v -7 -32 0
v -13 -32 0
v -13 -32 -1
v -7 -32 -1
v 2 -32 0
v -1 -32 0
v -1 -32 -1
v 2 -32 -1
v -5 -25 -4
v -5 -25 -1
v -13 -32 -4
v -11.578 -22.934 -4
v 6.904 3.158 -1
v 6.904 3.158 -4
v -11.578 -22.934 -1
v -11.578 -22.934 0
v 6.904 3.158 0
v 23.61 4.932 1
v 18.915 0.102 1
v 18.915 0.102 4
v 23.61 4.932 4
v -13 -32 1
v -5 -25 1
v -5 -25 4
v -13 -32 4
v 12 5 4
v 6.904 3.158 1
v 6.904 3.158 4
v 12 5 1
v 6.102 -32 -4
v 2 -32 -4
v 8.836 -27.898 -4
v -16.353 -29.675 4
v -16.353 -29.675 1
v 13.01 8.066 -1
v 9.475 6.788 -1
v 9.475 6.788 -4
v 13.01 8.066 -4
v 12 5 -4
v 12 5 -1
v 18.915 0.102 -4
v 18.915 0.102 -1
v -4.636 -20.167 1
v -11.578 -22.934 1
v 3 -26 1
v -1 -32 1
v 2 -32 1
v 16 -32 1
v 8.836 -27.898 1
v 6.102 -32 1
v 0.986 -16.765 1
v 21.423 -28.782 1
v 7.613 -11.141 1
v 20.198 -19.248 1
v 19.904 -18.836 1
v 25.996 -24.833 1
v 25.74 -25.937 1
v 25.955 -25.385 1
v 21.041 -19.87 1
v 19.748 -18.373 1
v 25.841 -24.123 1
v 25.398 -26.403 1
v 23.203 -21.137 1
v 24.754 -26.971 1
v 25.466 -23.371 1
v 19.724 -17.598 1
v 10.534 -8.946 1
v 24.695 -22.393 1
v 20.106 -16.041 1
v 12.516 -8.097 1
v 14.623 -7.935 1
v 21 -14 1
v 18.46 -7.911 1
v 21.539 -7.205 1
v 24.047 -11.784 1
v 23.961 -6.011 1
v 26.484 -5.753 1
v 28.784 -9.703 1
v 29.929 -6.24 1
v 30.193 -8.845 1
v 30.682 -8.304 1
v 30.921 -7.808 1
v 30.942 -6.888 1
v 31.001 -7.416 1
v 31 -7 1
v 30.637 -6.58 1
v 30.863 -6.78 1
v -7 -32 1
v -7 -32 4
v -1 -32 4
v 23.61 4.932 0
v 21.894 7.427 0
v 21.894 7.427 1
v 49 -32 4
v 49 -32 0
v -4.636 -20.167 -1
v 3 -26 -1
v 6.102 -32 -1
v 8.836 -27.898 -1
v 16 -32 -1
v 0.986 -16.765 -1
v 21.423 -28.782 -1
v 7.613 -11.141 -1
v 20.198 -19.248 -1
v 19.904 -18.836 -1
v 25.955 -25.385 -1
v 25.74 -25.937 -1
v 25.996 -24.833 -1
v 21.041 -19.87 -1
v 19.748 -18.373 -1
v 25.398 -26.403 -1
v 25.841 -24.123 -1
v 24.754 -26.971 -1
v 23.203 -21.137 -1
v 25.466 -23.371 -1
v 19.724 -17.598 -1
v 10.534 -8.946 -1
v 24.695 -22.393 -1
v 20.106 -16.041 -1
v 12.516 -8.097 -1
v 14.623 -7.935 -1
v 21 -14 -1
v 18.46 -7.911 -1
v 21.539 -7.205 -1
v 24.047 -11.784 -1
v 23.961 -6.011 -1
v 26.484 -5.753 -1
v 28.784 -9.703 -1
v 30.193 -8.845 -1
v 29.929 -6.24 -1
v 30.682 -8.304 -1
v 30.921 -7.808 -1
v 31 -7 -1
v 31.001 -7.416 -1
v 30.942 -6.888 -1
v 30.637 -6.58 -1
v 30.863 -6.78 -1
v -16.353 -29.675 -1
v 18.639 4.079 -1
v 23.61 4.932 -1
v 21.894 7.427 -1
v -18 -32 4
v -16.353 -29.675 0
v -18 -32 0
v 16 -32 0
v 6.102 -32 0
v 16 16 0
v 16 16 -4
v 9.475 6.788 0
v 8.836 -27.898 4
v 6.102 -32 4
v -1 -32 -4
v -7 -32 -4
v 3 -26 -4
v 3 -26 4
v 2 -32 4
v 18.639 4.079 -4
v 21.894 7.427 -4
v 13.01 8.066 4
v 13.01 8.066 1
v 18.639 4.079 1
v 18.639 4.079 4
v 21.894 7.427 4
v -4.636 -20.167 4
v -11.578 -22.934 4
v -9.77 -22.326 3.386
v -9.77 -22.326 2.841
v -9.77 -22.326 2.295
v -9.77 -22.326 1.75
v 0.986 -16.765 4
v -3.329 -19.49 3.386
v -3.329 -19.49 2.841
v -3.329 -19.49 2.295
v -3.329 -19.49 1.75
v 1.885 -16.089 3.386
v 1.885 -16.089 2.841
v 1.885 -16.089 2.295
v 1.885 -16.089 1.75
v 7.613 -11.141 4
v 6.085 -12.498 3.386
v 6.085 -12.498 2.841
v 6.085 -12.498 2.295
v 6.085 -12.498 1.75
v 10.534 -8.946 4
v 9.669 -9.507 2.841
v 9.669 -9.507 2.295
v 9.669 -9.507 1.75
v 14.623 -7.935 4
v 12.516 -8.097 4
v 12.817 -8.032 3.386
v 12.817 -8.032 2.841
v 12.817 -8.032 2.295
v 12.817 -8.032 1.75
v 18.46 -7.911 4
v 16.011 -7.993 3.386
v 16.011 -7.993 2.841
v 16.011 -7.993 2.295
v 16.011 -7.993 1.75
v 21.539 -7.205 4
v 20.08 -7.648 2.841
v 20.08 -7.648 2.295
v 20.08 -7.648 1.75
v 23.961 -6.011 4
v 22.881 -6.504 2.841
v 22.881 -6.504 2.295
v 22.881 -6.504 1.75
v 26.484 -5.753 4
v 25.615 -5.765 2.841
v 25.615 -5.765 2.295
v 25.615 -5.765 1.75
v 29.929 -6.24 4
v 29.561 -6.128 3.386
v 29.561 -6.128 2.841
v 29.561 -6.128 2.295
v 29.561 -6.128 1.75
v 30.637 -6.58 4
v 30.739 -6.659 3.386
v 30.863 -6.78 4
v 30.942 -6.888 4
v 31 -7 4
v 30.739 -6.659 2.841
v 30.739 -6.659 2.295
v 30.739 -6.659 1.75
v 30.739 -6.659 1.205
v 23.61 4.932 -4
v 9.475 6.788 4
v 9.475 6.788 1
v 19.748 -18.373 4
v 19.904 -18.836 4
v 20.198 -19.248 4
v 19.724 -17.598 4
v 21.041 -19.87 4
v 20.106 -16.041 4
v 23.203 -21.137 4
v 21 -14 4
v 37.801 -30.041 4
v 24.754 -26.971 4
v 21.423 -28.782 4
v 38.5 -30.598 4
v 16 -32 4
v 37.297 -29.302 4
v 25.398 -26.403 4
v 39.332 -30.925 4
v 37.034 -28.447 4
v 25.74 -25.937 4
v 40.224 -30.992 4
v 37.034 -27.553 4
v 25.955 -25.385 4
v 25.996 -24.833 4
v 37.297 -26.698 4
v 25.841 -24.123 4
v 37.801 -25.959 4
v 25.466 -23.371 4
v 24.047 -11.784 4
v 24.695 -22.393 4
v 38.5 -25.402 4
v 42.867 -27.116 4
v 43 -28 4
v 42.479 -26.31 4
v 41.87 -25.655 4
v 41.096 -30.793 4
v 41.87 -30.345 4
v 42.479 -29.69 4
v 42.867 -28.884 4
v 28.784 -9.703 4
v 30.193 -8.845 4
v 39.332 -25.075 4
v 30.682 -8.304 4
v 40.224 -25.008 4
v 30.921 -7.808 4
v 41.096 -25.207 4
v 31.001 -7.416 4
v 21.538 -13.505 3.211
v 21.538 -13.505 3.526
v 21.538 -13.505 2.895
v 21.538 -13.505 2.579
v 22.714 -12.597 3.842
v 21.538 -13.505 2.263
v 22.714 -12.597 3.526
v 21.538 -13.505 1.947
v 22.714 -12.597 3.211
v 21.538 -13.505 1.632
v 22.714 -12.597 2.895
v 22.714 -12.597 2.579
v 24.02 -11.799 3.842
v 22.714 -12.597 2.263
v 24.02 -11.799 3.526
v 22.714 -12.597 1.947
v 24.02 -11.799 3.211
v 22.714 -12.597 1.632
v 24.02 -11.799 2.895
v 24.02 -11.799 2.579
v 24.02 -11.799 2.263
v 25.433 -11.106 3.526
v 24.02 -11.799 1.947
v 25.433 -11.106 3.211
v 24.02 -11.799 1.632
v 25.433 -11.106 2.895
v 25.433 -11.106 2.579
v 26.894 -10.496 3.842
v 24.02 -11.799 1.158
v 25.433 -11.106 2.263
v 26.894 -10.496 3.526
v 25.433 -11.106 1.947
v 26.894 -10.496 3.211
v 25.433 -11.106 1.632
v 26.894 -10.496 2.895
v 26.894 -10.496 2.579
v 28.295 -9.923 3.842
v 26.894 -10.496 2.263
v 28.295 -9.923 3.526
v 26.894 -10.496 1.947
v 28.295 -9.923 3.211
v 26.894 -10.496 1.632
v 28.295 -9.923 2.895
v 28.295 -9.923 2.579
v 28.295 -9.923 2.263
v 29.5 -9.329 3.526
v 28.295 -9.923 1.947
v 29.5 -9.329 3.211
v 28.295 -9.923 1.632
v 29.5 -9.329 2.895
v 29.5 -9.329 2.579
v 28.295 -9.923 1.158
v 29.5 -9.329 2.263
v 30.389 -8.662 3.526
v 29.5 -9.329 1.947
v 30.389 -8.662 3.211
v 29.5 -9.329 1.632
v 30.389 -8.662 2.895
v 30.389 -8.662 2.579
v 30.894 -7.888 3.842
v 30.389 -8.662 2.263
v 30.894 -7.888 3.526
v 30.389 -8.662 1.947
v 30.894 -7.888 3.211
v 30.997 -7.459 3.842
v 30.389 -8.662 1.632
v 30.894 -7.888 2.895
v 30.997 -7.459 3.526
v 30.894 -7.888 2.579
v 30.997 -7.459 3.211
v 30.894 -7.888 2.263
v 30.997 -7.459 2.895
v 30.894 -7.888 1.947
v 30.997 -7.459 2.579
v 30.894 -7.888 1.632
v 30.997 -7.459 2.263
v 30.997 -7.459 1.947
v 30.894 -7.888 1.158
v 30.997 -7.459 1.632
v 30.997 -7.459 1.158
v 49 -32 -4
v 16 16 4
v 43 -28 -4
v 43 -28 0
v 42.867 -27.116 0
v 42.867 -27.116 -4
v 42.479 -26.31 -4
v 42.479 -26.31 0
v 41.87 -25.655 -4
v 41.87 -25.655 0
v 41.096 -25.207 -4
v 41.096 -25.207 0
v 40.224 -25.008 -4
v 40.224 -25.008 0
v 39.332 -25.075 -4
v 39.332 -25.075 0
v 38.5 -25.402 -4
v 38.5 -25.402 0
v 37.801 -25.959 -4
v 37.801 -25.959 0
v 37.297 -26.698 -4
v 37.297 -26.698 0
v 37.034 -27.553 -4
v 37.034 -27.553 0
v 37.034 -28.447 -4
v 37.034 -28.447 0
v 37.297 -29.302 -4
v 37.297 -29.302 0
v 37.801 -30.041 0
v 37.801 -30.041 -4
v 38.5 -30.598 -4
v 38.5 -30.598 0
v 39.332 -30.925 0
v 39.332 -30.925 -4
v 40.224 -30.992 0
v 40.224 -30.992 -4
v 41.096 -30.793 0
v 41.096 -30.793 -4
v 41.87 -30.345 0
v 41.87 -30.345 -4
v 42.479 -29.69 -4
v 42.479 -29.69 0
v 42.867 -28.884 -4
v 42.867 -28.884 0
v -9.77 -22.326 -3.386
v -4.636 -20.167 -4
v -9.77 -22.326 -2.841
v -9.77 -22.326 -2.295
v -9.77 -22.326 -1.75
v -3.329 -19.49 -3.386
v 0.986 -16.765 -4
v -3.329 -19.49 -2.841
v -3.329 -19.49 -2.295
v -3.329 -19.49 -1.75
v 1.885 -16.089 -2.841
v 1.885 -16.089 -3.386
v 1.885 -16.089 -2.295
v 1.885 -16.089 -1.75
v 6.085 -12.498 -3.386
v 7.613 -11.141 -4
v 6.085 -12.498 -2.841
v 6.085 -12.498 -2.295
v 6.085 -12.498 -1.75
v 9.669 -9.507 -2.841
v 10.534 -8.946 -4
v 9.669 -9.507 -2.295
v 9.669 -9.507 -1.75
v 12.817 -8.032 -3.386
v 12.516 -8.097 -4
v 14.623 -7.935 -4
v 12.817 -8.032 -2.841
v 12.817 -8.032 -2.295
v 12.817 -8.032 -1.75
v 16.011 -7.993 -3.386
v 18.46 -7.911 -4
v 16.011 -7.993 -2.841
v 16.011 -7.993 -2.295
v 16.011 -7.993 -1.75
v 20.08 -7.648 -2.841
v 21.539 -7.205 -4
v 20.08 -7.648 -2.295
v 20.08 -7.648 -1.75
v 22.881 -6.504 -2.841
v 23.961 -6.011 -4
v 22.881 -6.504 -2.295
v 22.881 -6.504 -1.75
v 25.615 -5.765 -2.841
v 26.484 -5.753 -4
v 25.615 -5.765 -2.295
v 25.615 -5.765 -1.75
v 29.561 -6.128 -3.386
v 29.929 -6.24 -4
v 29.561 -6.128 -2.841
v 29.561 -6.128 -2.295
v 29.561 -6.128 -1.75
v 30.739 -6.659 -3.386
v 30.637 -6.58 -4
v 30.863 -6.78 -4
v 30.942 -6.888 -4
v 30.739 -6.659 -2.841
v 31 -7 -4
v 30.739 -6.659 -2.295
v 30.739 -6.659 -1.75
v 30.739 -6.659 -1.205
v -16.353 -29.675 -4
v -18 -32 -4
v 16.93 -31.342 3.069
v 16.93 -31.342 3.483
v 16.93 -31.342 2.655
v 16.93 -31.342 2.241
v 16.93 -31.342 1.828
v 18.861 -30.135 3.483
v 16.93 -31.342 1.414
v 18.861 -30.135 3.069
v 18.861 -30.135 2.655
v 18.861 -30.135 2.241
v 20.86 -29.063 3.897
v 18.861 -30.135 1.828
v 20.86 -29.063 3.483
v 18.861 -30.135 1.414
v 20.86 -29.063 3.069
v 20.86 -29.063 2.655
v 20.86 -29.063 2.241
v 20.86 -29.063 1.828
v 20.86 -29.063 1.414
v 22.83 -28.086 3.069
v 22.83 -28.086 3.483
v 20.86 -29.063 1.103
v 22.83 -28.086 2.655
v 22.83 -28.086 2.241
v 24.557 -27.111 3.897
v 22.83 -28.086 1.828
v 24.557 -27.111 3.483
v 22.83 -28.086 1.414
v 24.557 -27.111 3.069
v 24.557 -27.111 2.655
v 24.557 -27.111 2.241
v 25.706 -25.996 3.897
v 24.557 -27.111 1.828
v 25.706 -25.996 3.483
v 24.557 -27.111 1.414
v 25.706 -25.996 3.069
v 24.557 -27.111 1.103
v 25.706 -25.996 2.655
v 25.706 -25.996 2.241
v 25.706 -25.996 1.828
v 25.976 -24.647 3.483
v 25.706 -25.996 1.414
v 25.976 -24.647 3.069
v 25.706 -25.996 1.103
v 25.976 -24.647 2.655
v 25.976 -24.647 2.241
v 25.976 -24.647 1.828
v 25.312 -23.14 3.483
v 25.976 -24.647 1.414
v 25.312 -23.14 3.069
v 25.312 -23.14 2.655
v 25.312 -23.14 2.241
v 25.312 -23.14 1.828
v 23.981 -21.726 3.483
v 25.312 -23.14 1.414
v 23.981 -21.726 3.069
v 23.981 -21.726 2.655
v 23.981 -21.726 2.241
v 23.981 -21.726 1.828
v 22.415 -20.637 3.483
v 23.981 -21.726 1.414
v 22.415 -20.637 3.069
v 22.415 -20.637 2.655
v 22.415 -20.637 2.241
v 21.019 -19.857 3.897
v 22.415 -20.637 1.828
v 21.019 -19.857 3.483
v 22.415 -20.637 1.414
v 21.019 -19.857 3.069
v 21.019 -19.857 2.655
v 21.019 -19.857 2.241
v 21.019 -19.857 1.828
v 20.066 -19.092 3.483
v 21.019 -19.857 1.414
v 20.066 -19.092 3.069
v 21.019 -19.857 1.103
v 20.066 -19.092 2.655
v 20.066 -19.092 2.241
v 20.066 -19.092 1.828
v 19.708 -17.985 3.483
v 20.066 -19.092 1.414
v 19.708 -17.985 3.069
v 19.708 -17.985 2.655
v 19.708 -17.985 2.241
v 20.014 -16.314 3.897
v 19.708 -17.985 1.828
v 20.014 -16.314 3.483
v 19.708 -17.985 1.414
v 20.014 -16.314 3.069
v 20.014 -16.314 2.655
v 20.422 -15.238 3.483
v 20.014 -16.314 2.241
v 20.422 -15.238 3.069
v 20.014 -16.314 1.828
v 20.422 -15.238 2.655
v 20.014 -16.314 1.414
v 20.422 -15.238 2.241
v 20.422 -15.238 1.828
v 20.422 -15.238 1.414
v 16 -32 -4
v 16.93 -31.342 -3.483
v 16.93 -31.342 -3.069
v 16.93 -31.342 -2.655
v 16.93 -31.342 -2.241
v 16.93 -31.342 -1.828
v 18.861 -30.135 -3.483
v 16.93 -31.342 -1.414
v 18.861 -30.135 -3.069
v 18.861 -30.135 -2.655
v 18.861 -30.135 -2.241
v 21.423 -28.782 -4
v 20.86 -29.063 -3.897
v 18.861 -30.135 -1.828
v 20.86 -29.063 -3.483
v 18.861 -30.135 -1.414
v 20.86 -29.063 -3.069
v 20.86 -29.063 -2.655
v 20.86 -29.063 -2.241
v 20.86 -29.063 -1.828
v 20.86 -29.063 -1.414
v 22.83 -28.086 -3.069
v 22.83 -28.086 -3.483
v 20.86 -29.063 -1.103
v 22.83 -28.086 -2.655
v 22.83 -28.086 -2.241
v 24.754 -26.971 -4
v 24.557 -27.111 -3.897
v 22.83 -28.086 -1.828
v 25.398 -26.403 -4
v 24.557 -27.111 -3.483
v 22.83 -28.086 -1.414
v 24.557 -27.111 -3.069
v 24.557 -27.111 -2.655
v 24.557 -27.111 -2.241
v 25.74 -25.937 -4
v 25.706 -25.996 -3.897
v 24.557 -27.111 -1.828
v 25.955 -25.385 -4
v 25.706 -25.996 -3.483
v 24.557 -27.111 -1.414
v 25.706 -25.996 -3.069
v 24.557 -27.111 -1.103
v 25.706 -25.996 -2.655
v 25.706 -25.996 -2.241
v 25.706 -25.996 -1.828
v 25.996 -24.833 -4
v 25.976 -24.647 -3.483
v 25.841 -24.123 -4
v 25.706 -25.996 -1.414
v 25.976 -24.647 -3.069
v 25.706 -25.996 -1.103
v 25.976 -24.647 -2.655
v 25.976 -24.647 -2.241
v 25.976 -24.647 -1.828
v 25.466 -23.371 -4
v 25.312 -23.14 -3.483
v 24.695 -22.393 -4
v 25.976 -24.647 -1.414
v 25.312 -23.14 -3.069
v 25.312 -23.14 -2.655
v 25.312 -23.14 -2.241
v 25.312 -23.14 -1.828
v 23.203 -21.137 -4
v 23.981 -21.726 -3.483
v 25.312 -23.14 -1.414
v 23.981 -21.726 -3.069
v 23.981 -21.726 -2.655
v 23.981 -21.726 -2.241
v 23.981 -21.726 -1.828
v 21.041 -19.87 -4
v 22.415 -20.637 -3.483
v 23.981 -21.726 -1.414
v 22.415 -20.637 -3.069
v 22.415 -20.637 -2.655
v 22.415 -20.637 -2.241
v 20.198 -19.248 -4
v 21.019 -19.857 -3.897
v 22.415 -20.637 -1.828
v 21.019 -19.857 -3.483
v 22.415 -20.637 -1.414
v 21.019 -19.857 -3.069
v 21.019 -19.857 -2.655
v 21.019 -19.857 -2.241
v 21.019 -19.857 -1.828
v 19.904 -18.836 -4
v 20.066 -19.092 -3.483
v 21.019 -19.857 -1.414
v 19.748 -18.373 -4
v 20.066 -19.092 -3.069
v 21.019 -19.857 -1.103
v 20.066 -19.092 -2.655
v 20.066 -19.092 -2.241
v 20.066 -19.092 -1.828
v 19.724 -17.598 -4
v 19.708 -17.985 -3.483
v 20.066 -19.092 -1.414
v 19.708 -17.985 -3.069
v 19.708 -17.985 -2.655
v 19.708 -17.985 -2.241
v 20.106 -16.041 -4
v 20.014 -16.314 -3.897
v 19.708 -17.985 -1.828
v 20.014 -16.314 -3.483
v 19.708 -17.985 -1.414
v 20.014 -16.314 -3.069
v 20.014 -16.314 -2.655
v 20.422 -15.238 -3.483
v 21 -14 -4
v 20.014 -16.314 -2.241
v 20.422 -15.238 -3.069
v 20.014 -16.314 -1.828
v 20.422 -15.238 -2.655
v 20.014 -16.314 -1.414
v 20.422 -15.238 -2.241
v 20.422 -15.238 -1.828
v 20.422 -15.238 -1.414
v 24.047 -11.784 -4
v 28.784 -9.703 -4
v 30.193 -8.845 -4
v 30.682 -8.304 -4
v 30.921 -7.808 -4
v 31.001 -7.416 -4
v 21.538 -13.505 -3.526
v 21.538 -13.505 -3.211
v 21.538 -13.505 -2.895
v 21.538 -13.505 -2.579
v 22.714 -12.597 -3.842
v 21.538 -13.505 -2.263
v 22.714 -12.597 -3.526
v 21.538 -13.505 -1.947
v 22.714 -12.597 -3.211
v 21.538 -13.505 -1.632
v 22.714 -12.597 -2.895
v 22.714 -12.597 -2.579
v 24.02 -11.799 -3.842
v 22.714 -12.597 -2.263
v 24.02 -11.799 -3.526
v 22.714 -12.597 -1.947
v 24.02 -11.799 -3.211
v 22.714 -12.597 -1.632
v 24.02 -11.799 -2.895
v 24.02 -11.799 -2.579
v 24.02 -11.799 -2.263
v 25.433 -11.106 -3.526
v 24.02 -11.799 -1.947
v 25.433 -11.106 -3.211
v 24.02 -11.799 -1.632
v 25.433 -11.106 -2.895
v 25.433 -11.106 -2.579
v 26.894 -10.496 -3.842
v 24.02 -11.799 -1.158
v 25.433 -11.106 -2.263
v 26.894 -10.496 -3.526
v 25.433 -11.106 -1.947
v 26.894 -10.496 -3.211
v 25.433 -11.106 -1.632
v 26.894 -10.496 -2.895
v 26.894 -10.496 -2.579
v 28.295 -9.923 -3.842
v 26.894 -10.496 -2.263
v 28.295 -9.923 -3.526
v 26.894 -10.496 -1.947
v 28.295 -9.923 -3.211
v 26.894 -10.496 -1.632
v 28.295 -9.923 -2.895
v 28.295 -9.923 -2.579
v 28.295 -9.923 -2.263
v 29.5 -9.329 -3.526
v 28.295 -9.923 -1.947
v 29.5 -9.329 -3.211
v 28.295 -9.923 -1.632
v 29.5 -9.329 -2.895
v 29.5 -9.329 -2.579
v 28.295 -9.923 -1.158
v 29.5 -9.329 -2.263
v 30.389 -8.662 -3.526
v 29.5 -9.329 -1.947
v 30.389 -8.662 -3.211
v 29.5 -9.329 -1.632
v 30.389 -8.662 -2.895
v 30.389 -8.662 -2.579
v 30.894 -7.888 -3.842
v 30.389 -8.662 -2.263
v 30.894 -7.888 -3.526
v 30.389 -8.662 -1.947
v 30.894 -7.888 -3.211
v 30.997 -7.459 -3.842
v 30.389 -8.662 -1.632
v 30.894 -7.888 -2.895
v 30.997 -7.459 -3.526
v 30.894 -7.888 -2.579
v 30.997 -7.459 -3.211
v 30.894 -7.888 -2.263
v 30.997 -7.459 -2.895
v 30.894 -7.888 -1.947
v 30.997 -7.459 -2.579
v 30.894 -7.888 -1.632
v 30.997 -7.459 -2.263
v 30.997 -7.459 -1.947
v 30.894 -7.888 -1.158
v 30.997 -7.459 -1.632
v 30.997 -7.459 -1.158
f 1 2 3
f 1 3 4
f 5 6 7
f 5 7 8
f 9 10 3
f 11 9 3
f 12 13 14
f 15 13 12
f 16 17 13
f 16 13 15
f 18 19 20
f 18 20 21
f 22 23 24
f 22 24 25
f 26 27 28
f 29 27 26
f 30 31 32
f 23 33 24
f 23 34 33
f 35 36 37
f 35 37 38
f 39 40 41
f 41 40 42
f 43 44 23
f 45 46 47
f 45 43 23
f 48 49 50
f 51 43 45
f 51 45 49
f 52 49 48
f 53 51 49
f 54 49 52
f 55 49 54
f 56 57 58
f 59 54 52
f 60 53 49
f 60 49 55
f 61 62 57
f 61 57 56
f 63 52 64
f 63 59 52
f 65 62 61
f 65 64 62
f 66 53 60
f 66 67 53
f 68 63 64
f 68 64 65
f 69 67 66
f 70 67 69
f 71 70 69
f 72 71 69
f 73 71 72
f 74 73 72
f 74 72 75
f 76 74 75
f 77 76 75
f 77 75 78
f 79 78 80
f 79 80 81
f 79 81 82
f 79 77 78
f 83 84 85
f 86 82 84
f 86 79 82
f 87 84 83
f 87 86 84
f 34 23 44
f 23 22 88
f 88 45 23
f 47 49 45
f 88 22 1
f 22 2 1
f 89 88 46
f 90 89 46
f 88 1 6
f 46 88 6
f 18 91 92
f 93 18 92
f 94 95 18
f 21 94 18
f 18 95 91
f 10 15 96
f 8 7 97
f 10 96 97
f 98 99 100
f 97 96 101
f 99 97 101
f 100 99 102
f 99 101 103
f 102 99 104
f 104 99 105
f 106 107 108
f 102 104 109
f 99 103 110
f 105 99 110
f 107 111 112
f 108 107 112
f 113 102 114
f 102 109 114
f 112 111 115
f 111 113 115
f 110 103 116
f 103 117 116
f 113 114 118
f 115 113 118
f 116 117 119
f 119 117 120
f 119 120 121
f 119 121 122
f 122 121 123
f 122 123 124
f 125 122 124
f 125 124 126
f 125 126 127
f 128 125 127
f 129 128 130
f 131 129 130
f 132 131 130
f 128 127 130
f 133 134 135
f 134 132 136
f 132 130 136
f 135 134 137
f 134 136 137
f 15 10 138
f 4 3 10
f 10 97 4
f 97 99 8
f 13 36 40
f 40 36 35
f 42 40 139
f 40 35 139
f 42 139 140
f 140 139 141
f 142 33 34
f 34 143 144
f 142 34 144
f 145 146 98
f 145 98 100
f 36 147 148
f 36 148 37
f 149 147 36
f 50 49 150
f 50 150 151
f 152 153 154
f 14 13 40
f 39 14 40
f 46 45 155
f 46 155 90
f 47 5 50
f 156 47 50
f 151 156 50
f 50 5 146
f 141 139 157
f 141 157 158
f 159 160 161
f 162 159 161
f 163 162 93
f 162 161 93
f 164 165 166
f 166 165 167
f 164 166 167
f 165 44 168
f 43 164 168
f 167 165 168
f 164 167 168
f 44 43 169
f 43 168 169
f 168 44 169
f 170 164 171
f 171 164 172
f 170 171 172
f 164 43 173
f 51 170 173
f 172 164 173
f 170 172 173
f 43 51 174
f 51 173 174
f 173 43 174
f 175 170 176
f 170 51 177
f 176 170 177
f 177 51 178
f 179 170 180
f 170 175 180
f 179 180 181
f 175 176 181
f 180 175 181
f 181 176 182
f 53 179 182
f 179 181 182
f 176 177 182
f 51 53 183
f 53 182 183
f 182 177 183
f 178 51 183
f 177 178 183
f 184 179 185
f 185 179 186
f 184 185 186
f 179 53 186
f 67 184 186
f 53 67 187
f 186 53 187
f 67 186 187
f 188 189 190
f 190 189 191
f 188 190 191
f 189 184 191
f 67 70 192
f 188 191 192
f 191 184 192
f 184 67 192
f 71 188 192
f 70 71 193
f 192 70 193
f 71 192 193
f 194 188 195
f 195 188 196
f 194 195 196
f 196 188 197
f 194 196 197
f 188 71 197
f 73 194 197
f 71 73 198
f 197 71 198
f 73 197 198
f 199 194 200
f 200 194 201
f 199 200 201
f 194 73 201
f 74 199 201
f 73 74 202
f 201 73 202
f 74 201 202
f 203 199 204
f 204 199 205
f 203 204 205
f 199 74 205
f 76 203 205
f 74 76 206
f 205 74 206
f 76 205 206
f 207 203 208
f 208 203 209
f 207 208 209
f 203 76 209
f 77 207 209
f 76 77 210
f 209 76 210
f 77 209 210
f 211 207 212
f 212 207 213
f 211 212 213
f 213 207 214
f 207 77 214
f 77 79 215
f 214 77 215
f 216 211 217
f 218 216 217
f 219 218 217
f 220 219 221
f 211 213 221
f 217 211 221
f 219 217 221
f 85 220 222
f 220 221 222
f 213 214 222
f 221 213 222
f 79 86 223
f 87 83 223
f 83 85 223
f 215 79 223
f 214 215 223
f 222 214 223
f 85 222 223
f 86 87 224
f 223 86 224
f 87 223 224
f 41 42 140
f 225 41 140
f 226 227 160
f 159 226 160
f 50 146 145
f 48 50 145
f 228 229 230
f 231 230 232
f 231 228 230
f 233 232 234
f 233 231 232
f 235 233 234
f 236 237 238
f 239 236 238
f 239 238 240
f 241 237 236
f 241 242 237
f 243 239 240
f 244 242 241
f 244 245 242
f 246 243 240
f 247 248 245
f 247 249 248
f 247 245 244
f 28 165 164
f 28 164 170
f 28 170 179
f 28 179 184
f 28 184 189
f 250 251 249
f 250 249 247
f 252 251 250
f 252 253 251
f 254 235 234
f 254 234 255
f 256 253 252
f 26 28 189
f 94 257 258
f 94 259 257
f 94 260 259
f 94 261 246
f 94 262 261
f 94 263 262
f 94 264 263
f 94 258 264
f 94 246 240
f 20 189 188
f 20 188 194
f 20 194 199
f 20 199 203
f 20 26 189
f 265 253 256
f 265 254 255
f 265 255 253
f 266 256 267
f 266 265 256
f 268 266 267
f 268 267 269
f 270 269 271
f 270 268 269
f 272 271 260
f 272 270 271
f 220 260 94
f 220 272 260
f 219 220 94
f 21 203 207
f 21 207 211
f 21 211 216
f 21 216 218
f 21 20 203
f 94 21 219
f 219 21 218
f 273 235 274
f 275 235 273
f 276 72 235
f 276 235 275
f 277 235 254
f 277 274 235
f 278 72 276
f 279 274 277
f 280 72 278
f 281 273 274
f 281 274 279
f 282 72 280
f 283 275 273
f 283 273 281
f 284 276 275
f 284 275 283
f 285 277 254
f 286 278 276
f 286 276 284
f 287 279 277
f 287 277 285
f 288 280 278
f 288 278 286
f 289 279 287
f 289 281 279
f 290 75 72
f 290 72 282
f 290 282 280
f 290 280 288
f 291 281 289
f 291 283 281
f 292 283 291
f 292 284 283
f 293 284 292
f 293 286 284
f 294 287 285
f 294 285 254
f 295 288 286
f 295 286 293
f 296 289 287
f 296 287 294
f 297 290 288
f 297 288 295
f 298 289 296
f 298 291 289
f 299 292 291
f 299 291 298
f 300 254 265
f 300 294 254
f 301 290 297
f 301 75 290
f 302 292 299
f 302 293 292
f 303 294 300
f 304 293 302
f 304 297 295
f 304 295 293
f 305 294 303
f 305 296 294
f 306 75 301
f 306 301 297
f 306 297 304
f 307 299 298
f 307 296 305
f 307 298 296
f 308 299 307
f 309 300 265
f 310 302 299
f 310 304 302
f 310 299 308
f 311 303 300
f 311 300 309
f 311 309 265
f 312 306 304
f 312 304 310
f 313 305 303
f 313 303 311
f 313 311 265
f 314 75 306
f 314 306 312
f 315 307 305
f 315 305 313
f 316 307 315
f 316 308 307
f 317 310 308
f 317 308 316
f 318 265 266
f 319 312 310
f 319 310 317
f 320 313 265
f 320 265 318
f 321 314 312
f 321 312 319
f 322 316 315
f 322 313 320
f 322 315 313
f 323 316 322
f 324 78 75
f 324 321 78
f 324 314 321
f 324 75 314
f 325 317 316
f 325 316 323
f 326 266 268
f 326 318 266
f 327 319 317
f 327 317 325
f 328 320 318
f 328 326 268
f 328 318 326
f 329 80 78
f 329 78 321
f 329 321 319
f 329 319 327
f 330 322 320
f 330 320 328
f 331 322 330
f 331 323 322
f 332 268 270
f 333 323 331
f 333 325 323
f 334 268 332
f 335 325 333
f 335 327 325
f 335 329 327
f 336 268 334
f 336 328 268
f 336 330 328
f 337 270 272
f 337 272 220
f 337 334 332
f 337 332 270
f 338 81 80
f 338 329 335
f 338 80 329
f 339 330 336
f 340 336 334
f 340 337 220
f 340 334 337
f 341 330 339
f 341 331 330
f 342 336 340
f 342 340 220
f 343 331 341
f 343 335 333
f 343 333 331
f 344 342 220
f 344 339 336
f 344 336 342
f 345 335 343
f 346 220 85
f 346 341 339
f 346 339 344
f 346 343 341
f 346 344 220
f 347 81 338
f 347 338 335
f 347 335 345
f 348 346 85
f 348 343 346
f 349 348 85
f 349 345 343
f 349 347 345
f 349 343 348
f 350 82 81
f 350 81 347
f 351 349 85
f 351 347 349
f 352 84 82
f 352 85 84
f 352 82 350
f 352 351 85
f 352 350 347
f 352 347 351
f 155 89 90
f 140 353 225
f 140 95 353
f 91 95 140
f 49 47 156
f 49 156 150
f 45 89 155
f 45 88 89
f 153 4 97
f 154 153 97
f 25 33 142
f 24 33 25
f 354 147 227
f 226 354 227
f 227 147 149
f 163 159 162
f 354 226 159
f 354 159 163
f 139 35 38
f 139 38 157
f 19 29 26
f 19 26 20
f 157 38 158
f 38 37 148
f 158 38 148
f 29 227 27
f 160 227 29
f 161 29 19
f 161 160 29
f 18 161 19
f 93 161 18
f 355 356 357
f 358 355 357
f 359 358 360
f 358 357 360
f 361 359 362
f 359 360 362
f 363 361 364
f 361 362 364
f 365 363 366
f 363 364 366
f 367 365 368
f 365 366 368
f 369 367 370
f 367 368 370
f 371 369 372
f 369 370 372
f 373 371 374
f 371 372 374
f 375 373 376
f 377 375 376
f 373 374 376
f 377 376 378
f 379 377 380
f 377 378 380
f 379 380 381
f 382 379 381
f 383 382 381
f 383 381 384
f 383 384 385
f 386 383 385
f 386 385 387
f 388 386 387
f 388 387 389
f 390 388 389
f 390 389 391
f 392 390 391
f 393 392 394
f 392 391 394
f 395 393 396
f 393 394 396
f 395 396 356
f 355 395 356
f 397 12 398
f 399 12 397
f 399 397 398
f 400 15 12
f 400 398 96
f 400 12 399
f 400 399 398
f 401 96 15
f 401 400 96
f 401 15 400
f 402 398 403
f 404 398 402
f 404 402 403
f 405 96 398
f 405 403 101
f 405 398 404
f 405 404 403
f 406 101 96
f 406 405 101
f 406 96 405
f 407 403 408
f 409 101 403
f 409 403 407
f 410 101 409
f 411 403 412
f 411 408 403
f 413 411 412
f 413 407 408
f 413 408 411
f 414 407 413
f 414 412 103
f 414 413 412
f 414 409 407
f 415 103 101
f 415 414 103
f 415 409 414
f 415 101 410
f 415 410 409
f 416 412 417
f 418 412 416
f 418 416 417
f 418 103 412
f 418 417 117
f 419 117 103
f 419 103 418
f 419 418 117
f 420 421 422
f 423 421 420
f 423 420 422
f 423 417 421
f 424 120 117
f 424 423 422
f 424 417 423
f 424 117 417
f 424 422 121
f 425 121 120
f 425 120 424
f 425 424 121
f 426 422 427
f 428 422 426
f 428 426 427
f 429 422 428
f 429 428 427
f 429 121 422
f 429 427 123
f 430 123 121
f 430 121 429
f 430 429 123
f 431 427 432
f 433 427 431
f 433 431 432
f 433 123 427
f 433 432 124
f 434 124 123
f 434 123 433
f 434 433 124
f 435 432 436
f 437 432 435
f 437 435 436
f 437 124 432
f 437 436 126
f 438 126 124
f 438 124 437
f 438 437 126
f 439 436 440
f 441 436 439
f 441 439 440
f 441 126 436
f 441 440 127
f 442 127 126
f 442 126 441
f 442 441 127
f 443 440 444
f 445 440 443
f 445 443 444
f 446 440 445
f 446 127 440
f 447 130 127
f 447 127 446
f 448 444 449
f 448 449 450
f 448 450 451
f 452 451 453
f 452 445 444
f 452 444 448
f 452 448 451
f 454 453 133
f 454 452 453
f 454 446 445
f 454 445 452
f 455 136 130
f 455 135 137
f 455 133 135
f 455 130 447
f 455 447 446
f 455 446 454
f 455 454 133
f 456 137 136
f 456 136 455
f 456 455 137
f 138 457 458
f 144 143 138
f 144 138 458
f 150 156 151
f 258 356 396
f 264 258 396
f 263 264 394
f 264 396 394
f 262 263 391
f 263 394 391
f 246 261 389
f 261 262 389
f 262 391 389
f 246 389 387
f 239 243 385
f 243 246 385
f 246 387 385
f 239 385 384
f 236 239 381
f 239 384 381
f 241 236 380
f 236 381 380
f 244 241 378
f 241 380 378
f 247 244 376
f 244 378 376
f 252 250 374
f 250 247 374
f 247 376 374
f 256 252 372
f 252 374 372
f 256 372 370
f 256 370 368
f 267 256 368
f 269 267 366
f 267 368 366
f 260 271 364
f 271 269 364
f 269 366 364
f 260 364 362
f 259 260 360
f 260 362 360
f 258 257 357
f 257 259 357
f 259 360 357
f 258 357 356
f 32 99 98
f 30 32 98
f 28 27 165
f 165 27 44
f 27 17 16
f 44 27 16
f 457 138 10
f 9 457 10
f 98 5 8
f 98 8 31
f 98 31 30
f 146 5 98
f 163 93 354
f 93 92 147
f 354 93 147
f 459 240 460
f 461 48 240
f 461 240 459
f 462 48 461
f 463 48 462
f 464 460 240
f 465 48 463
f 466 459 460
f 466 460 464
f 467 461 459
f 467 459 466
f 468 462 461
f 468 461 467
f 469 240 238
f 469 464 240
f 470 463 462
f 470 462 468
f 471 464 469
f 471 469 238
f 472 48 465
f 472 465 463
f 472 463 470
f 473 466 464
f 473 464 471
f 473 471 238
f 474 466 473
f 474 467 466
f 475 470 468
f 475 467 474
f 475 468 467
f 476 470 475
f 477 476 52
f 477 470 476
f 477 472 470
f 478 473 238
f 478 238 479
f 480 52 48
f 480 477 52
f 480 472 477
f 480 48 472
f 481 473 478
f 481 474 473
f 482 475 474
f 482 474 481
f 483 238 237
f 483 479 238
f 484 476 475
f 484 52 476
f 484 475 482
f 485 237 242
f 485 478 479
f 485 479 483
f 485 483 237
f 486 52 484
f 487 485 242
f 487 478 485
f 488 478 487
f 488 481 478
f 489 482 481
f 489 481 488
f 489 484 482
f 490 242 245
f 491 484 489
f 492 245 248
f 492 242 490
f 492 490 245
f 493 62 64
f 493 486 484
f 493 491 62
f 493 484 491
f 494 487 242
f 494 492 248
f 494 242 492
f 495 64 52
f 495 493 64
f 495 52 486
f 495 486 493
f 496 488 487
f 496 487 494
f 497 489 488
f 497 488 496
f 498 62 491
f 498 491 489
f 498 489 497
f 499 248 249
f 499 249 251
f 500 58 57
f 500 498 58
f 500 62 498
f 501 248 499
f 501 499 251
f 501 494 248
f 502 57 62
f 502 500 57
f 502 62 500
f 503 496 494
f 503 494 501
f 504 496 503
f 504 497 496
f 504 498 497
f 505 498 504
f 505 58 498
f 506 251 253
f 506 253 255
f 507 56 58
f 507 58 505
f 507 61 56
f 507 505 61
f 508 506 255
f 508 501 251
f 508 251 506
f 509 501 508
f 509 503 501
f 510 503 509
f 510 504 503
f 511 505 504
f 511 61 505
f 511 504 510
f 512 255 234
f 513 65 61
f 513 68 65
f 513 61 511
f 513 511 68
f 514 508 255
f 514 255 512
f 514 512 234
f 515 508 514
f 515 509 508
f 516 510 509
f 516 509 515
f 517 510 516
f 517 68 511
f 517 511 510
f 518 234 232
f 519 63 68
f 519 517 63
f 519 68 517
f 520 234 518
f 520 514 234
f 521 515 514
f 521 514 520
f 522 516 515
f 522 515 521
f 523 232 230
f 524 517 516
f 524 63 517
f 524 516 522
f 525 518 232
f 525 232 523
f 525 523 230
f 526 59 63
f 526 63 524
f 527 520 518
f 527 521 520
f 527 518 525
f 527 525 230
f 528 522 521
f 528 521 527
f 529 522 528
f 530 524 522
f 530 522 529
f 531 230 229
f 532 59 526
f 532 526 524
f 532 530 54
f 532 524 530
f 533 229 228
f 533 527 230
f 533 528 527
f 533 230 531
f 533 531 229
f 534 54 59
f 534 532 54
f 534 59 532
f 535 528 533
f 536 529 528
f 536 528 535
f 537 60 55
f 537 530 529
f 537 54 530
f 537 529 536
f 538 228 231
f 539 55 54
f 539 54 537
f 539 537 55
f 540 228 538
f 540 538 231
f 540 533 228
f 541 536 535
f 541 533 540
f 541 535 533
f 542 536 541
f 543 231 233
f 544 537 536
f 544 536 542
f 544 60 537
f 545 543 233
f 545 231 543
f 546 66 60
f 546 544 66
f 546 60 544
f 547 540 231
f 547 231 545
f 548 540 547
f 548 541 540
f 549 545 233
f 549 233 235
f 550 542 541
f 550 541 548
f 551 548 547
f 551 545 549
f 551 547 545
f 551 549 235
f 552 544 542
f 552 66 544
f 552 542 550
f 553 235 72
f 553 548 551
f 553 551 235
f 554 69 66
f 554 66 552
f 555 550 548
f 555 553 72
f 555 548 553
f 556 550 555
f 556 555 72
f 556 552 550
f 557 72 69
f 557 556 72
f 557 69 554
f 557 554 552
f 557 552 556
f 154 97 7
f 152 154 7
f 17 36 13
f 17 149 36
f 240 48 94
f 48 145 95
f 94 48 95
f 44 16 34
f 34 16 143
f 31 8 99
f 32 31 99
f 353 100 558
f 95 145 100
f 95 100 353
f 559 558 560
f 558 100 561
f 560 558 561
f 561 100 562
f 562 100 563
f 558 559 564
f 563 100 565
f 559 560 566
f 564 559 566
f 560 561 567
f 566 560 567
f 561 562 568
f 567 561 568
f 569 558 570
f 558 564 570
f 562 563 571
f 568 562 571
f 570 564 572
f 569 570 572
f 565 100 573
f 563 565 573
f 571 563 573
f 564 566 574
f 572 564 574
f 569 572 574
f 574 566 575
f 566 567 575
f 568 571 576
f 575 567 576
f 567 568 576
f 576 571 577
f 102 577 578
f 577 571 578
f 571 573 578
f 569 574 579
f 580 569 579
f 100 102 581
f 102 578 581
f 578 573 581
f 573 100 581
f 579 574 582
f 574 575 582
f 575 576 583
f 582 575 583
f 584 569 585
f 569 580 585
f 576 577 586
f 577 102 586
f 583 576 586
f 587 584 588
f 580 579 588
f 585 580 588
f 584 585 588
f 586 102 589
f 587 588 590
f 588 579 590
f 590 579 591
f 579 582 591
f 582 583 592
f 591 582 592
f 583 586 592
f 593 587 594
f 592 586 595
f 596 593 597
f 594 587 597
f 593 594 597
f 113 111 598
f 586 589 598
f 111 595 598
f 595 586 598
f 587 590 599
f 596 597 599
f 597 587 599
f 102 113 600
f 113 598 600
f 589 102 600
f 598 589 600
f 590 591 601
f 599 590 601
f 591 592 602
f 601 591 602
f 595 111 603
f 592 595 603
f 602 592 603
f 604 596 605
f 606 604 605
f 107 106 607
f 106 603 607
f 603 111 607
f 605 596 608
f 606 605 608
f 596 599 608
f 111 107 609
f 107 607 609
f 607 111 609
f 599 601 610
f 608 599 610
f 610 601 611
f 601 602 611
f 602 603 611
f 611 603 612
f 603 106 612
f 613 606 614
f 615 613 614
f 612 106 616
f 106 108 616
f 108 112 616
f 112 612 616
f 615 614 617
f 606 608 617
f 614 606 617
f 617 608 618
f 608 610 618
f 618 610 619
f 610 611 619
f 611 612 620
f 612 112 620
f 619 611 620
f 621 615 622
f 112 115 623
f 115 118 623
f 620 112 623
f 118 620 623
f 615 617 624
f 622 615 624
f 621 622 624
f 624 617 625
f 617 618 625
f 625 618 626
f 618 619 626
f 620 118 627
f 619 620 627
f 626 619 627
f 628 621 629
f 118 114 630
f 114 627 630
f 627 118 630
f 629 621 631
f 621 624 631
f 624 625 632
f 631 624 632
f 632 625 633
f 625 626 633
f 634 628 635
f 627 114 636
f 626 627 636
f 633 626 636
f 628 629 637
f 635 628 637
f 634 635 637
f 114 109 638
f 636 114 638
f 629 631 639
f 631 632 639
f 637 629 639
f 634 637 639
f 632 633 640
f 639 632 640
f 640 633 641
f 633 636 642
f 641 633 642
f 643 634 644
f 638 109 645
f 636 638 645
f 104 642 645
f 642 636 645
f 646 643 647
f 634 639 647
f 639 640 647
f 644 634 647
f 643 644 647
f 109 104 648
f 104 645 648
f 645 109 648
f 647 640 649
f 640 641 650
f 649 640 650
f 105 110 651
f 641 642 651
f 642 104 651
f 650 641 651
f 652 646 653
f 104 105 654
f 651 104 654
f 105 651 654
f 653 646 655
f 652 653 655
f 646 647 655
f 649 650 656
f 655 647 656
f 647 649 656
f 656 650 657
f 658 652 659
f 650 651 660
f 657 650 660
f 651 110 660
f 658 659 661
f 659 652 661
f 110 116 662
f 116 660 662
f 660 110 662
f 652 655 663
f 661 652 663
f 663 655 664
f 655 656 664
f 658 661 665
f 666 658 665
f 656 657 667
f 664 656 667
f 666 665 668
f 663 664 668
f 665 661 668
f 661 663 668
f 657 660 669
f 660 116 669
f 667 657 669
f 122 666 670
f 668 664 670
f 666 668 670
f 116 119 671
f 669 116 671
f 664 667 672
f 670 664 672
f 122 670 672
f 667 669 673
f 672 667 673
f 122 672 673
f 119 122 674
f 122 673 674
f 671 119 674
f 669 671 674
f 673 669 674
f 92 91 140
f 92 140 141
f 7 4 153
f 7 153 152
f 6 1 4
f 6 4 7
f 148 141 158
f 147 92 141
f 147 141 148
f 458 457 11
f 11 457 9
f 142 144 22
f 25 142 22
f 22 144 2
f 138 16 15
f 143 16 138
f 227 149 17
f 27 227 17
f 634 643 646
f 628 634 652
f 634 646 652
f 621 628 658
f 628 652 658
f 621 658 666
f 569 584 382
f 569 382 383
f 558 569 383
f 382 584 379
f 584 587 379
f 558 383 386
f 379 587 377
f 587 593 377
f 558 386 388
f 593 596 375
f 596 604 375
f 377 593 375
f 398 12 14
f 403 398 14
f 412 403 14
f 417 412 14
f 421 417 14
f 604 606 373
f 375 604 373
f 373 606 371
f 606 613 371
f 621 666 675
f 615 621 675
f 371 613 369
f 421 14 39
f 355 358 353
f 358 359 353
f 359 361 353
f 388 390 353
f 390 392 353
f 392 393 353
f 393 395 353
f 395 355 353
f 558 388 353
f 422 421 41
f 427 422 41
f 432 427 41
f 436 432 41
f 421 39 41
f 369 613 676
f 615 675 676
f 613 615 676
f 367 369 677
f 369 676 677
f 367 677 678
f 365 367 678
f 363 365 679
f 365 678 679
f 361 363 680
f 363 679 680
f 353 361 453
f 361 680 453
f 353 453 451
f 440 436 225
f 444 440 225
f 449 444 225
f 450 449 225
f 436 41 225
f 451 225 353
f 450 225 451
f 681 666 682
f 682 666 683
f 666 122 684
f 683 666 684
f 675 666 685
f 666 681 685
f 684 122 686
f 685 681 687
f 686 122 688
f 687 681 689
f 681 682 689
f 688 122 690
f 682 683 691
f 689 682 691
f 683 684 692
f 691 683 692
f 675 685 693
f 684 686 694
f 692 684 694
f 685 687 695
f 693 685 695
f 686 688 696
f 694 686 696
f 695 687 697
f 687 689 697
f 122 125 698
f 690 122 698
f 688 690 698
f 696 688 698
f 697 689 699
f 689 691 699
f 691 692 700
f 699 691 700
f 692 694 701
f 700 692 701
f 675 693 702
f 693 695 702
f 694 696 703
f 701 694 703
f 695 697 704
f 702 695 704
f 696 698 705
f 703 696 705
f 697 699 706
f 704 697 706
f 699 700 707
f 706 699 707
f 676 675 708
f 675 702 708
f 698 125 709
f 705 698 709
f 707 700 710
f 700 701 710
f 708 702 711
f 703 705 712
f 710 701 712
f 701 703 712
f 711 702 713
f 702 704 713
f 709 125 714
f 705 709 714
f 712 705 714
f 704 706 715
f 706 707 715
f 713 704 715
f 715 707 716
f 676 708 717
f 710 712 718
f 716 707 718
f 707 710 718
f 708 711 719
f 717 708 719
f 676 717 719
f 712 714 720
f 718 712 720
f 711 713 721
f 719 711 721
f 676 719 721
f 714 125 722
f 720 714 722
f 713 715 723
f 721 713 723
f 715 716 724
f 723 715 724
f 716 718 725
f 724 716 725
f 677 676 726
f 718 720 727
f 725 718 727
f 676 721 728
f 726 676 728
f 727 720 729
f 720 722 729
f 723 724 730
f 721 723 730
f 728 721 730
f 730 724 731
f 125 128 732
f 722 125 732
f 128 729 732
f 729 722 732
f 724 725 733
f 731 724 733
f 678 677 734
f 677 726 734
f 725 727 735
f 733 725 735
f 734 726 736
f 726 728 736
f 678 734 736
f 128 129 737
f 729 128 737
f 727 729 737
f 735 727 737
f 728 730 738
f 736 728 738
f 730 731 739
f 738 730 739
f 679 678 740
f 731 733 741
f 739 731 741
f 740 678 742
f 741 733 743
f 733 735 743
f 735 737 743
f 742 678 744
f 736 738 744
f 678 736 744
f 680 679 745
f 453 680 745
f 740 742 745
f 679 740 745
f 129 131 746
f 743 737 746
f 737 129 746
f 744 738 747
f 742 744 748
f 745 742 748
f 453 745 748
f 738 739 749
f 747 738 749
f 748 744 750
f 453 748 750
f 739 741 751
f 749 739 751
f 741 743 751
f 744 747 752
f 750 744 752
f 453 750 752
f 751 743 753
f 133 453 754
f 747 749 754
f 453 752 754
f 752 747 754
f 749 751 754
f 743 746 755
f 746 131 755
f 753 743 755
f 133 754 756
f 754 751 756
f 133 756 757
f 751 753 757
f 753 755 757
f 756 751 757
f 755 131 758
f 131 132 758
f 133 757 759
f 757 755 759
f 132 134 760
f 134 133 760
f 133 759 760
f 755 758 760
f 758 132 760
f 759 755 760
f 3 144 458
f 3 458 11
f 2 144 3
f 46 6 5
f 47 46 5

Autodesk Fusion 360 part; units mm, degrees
sketch "Sketch1" plane through (0, 0, 0) normal (0, 0, 1) x (1, 0, 0)
  line L0 (16, -32) -> (49, -32)
  line L1 (49, -32) -> (16, 16)
  line L2 (16, 16) -> (-18, -32)
  line L3 (-18, -32) -> (16, -32)
  line L4 (6.9036, 3.1581) -> (12, 5)
  line L5 (12, 5) -> (18.9151, 0.1018)
  line L6 (18.9151, 0.1018) -> (23.6095, 4.9317)
  line L7 (9.4751, 6.7884) -> (13.0104, 8.0662)
  line L8 (13.0104, 8.0662) -> (18.6393, 4.079)
  line L9 (18.6393, 4.079) -> (21.8937, 7.4273)
  spline S0 degree 5 poles (-11.5783, -22.934) (-11.1719, -22.8047) (-10.3686, -22.5411) (-9.1924, -22.131) (-7.6814, -21.5545) (-5.8884, -20.7848) (-4.1909, -19.9669) (-2.5883, -19.1024) (-1.0791, -18.1949) (0.3395, -17.2494) (1.6718, -16.2734) (2.9238, -15.2771) (4.1036, -14.2738) (5.2212, -13.28) (6.2866, -12.314) (7.3091, -11.3958) (8.2961, -10.5464) (9.2523, -9.7868) (10.1779, -9.138) (11.0689, -8.6194) (11.9234, -8.2438) (12.7462, -8.0133) (13.5537, -7.9151) (14.3813, -7.9154) (15.2737, -7.9654) (16.2655, -8.0123) (17.3668, -8.0088) (18.5423, -7.9244) (19.7096, -7.751) (20.775, -7.4967) (21.6638, -7.1823) (22.3471, -6.8373) (22.8839, -6.495) (23.408, -6.189) (24.0588, -5.9485) (24.9228, -5.7932) (25.9824, -5.7301) (27.1553, -5.7571) (28.3245, -5.867) (29.3686, -6.0505) (30.1971, -6.3) (30.654, -6.5496) (30.8745, -6.7641) (30.9672, -6.9193) (31, -7) knots 0 0 0 0 0 0 0.025 0.05 0.075 0.1 0.125 0.15 0.175 0.2 0.225 0.25 0.275 0.3 0.325 0.35 0.375 0.4 0.425 0.45 0.475 0.5 0.525 0.55 0.575 0.6 0.625 0.65 0.675 0.7 0.725 0.75 0.775 0.8 0.825 0.85 0.875 0.9 0.925 0.95 0.975 1 1 1 1 1 1
  spline S1 degree 5 poles (16, -32) (16.2129, -31.8431) (16.6419, -31.5341) (17.2954, -31.0855) (18.1866, -30.5169) (19.331, -29.8547) (20.4971, -29.2376) (21.6671, -28.6584) (22.8105, -28.1039) (23.8816, -27.5544) (24.814, -26.9803) (25.5327, -26.35) (25.97, -25.6391) (26.079, -24.8387) (25.8511, -23.9663) (25.3259, -23.0702) (24.5738, -22.2108) (23.6834, -21.4452) (22.7478, -20.8116) (21.8505, -20.3104) (21.0551, -19.896) (20.41, -19.4977) (19.9496, -19.0357) (19.6969, -18.4388) (19.6655, -17.6613) (19.8619, -16.6777) (20.2027, -15.7167) (20.5614, -14.8968) (20.8462, -14.3063) (21, -14) knots 0 0 0 0 0 0 0.04 0.08 0.12 0.16 0.2 0.24 0.28 0.32 0.36 0.4 0.44 0.48 0.52 0.56 0.6 0.64 0.68 0.72 0.76 0.8 0.84 0.88 0.92 0.96 1 1 1 1 1 1
  spline S2 degree 5 poles (21, -14) (21.1322, -13.8712) (21.402, -13.6178) (21.8224, -13.2509) (22.4149, -12.7878) (23.2088, -12.2535) (24.054, -11.7636) (24.9442, -11.3167) (25.8673, -10.9084) (26.802, -10.5305) (27.7174, -10.1698) (28.5785, -9.8113) (29.3492, -9.4392) (29.9969, -9.0393) (30.4972, -8.6005) (30.8387, -8.1172) (30.9829, -7.6934) (31.0192, -7.3548) (31.0117, -7.1198) (31, -7) knots 0 0 0 0 0 0 0.066667 0.133333 0.2 0.266667 0.333333 0.4 0.466667 0.533333 0.6 0.666667 0.733333 0.8 0.866667 0.933333 1 1 1 1 1 1
  line L10 (-16.353, -29.6748) -> (-5, -25)
  line L11 (-5, -25) -> (-13, -32)
  line L12 (-7, -32) -> (3, -26)
  line L13 (3, -26) -> (-1, -32)
  line L14 (2, -32) -> (8.8358, -27.8985)
  line L15 (8.8358, -27.8985) -> (6.1015, -32)
  circle A0 centre (40, -28) radius 3
  point P0 (2, -16)
  point P1 (9, -10)
  point P2 (13, -8)
  point P3 (17, -8)
  point P4 (22, -7)
  point P5 (24, -6)
  point P6 (29, -6)
  point P7 (23, -28)
  point P8 (26, -25)
  point P9 (23, -21)
  point P10 (20, -19)
  point P11 (25.5558, -11.0517)
  point P12 (30, -9)
extrude "Extrude1" add sketch "Sketch1" along normal mid plane 8 contours L0 L1 L2 L4 L5 L6 S0 S1 S2 | L3 L14 L15 | L1 L2 L7 L8 L9 | L3 L12 L13 | L2 L3 L10 L11 makes body 1 at (30.5652, -19.508, 4) makes body 2 at (16.9681, 10.4978, 4) makes body 3 at (-12.5687, -28.1165, 1.3333) makes body 4 at (-3.6667, -30, 1.3333) makes body 5 at (4.2786, -30.6328, 1.3333)
extrude "Extrude2" add sketch "Sketch1" along normal mid plane 2 contours L2 L3 S0 S1 S2 L10 L11 L12 L13 L14 L15 | L1 L2 L4 L5 L6 L7 L8 L9 bodies 1 2 3 4 5
